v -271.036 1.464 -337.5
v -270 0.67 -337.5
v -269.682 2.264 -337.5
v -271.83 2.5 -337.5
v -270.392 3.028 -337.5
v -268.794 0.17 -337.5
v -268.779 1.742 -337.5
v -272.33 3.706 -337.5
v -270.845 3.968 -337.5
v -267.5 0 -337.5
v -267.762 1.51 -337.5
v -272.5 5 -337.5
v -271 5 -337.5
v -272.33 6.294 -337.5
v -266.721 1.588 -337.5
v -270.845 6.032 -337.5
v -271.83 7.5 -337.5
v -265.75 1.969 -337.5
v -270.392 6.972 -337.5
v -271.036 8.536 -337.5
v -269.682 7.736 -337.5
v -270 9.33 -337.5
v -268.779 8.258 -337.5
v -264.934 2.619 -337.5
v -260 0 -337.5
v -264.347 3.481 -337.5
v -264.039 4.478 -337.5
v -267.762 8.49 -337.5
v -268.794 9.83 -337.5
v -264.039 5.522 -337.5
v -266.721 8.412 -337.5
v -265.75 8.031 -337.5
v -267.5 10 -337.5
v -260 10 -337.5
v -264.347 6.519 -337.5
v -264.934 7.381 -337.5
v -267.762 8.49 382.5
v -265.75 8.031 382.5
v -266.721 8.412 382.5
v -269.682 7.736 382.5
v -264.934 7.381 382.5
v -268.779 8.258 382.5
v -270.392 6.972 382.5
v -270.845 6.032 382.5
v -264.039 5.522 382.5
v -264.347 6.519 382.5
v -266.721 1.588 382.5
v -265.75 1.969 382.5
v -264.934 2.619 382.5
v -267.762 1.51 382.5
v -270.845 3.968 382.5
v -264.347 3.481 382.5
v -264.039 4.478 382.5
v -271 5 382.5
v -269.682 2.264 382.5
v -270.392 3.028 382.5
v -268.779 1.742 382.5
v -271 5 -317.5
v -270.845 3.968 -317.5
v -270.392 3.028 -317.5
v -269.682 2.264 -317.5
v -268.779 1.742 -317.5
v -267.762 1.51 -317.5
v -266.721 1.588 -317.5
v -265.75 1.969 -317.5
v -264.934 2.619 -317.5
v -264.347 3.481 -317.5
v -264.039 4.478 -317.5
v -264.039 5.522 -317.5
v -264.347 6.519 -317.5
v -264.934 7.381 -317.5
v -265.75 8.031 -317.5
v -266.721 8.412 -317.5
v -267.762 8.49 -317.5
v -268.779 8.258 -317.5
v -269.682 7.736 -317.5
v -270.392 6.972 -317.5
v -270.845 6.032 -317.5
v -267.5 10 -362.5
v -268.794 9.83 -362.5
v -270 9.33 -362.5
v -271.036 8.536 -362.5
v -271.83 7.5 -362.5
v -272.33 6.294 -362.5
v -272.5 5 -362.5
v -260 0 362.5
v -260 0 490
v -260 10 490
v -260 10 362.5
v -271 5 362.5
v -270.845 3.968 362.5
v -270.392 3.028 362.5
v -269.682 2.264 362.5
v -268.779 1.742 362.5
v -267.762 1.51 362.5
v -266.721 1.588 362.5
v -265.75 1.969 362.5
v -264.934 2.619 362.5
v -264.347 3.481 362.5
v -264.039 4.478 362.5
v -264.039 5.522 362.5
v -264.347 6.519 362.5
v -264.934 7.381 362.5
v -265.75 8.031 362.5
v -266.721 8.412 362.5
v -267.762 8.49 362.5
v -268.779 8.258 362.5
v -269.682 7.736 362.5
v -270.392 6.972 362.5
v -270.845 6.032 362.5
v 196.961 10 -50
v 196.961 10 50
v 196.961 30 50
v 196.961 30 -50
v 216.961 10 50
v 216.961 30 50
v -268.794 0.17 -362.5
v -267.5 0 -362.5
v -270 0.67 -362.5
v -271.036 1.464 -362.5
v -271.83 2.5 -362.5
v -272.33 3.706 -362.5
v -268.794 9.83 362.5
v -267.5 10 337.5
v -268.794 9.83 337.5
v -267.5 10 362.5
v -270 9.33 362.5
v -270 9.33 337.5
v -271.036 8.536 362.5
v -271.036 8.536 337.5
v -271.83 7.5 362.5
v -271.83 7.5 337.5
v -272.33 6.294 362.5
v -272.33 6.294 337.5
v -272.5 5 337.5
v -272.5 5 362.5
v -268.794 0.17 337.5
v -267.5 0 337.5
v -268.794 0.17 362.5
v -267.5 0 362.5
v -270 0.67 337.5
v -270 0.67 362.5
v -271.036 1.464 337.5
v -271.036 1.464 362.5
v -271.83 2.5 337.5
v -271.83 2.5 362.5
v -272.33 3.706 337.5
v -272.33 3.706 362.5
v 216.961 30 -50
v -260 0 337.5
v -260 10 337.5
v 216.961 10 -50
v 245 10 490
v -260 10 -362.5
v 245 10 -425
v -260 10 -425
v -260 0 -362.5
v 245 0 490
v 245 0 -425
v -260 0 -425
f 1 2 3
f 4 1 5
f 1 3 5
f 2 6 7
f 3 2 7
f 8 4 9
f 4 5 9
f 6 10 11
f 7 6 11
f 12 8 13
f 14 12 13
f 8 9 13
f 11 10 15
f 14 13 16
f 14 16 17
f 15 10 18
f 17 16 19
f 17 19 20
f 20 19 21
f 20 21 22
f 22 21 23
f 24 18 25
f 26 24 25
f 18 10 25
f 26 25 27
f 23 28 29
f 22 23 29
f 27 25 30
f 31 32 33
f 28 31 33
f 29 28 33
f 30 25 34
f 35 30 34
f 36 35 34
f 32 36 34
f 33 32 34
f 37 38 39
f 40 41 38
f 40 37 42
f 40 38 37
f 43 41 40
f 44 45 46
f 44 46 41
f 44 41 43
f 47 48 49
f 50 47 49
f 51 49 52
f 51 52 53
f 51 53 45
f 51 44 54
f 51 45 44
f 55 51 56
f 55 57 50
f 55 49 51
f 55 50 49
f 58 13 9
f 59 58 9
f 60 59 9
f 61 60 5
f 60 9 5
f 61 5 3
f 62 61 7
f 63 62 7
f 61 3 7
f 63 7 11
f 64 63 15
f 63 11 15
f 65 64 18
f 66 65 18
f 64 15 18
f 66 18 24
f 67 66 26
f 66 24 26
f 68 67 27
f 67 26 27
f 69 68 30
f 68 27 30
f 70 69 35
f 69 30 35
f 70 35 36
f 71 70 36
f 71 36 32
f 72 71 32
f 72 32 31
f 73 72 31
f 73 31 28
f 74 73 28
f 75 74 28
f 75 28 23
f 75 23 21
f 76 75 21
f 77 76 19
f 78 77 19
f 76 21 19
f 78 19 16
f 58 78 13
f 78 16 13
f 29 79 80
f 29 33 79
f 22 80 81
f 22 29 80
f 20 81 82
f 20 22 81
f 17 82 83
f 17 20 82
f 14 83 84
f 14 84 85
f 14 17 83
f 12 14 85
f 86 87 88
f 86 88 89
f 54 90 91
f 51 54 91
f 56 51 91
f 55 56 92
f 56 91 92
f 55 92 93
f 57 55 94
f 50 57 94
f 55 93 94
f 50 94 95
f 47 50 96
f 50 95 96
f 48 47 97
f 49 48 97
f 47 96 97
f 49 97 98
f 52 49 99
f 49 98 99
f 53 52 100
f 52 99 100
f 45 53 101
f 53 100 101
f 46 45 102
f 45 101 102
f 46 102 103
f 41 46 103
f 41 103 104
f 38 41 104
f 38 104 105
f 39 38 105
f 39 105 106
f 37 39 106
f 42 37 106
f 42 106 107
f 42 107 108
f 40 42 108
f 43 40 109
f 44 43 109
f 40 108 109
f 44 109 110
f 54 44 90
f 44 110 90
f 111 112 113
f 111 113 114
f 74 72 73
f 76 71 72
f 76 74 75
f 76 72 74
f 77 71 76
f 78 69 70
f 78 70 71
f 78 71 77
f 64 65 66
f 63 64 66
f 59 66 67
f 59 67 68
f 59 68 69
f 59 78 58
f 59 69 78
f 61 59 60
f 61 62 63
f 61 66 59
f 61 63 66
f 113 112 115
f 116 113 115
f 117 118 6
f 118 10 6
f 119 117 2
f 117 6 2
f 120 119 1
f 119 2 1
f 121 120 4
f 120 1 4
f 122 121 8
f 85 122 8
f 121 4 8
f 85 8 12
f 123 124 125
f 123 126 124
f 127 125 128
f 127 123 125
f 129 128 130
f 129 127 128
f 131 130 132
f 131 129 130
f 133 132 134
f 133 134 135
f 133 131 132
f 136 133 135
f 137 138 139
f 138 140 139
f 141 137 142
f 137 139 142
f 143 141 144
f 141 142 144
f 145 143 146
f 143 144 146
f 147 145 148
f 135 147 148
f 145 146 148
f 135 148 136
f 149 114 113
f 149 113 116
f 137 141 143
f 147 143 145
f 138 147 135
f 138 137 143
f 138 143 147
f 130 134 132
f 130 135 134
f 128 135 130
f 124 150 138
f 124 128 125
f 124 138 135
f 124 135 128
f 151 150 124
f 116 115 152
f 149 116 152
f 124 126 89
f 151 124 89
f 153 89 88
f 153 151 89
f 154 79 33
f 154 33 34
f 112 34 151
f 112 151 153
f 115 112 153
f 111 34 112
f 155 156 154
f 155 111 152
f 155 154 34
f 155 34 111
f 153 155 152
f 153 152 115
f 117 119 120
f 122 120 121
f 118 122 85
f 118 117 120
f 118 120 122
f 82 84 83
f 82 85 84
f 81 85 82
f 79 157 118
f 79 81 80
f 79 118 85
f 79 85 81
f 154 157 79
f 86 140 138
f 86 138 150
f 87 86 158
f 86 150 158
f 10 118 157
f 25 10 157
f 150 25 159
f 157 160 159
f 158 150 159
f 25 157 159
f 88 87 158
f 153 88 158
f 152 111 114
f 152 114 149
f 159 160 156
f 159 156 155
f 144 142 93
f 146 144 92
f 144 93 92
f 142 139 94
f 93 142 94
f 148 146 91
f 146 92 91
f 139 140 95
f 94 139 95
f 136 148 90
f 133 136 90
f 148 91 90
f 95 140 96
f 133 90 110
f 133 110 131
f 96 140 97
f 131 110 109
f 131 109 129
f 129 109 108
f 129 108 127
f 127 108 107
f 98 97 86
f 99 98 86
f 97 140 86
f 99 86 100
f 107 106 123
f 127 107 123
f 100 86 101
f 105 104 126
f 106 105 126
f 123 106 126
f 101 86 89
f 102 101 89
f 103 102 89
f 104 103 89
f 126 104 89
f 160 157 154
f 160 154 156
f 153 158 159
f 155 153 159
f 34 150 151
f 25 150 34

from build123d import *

# Parameters (mm, degrees)
SKETCH1_W           = 505
SKETCH1_H           = 915
BOSS_EXTRUDE1_DEPTH = 10
SKETCH2_W           = 25
SKETCH2_H           = 10
BOSS_EXTRUDE2_DEPTH = 12.5
SKETCH3_R           = 3.5
BOSS_EXTRUDE3_DEPTH = 20
LPATTERN1_COUNT     = 2
LPATTERN1_PITCH     = 700
FILLET1_R           = 5
SKETCH4_W           = 20
SKETCH4_H           = 100
BOSS_EXTRUDE4_DEPTH = 20


with BuildPart() as part:
    # Sketch1 → Boss-Extrude1 (new body)
    with BuildSketch(Plane(origin=(0, 0, 0), x_dir=(1, 0, 0), z_dir=(0, 1, 0))):
        with Locations((-7.5, -32.5)):
            Rectangle(SKETCH1_W, SKETCH1_H)
    extrude(amount=BOSS_EXTRUDE1_DEPTH)

    # Sketch2 → Boss-Extrude2 (add)
    with BuildSketch(Plane.ZY.offset(260)):
        with Locations((-350, 5)):
            Rectangle(SKETCH2_W, SKETCH2_H)
        with Locations((350, 5)):
            Rectangle(SKETCH2_W, SKETCH2_H)
    extrude(amount=BOSS_EXTRUDE2_DEPTH)

    # Sketch3 → Boss-Extrude3 (add)
    with BuildSketch(Plane.XY.offset(-337.5)):
        with Locations(Location((-267.5, 5, 0), (0, 0, 180))):
            Circle(SKETCH3_R)
    boss_extrude3 = extrude(amount=BOSS_EXTRUDE3_DEPTH)

    # LPattern1: Boss-Extrude3 ×2
    with Locations(*[(0, 0, i * LPATTERN1_PITCH) for i in range(1, LPATTERN1_COUNT)]):
        add(boss_extrude3)

    # Fillet1
    fillet1_edges = [part.edges().sort_by_distance(p)[0] for p in [
        (-272.5, 0, 350),
        (-272.5, 10, 350),
        (-272.5, 0, -350),
        (-272.5, 10, -350),
    ]]
    fillet(fillet1_edges, radius=FILLET1_R - 0.0001)  # a hair under: the kernel refuses the full size

    # Sketch4 → Boss-Extrude4 (add)
    with BuildSketch(Plane(origin=(0, 10, 0), x_dir=(1, 0, 0), z_dir=(0, 1, 0))):
        with Locations((206.961175434, 0)):
            Rectangle(SKETCH4_W, SKETCH4_H)
    extrude(amount=BOSS_EXTRUDE4_DEPTH)


solid = part.part
